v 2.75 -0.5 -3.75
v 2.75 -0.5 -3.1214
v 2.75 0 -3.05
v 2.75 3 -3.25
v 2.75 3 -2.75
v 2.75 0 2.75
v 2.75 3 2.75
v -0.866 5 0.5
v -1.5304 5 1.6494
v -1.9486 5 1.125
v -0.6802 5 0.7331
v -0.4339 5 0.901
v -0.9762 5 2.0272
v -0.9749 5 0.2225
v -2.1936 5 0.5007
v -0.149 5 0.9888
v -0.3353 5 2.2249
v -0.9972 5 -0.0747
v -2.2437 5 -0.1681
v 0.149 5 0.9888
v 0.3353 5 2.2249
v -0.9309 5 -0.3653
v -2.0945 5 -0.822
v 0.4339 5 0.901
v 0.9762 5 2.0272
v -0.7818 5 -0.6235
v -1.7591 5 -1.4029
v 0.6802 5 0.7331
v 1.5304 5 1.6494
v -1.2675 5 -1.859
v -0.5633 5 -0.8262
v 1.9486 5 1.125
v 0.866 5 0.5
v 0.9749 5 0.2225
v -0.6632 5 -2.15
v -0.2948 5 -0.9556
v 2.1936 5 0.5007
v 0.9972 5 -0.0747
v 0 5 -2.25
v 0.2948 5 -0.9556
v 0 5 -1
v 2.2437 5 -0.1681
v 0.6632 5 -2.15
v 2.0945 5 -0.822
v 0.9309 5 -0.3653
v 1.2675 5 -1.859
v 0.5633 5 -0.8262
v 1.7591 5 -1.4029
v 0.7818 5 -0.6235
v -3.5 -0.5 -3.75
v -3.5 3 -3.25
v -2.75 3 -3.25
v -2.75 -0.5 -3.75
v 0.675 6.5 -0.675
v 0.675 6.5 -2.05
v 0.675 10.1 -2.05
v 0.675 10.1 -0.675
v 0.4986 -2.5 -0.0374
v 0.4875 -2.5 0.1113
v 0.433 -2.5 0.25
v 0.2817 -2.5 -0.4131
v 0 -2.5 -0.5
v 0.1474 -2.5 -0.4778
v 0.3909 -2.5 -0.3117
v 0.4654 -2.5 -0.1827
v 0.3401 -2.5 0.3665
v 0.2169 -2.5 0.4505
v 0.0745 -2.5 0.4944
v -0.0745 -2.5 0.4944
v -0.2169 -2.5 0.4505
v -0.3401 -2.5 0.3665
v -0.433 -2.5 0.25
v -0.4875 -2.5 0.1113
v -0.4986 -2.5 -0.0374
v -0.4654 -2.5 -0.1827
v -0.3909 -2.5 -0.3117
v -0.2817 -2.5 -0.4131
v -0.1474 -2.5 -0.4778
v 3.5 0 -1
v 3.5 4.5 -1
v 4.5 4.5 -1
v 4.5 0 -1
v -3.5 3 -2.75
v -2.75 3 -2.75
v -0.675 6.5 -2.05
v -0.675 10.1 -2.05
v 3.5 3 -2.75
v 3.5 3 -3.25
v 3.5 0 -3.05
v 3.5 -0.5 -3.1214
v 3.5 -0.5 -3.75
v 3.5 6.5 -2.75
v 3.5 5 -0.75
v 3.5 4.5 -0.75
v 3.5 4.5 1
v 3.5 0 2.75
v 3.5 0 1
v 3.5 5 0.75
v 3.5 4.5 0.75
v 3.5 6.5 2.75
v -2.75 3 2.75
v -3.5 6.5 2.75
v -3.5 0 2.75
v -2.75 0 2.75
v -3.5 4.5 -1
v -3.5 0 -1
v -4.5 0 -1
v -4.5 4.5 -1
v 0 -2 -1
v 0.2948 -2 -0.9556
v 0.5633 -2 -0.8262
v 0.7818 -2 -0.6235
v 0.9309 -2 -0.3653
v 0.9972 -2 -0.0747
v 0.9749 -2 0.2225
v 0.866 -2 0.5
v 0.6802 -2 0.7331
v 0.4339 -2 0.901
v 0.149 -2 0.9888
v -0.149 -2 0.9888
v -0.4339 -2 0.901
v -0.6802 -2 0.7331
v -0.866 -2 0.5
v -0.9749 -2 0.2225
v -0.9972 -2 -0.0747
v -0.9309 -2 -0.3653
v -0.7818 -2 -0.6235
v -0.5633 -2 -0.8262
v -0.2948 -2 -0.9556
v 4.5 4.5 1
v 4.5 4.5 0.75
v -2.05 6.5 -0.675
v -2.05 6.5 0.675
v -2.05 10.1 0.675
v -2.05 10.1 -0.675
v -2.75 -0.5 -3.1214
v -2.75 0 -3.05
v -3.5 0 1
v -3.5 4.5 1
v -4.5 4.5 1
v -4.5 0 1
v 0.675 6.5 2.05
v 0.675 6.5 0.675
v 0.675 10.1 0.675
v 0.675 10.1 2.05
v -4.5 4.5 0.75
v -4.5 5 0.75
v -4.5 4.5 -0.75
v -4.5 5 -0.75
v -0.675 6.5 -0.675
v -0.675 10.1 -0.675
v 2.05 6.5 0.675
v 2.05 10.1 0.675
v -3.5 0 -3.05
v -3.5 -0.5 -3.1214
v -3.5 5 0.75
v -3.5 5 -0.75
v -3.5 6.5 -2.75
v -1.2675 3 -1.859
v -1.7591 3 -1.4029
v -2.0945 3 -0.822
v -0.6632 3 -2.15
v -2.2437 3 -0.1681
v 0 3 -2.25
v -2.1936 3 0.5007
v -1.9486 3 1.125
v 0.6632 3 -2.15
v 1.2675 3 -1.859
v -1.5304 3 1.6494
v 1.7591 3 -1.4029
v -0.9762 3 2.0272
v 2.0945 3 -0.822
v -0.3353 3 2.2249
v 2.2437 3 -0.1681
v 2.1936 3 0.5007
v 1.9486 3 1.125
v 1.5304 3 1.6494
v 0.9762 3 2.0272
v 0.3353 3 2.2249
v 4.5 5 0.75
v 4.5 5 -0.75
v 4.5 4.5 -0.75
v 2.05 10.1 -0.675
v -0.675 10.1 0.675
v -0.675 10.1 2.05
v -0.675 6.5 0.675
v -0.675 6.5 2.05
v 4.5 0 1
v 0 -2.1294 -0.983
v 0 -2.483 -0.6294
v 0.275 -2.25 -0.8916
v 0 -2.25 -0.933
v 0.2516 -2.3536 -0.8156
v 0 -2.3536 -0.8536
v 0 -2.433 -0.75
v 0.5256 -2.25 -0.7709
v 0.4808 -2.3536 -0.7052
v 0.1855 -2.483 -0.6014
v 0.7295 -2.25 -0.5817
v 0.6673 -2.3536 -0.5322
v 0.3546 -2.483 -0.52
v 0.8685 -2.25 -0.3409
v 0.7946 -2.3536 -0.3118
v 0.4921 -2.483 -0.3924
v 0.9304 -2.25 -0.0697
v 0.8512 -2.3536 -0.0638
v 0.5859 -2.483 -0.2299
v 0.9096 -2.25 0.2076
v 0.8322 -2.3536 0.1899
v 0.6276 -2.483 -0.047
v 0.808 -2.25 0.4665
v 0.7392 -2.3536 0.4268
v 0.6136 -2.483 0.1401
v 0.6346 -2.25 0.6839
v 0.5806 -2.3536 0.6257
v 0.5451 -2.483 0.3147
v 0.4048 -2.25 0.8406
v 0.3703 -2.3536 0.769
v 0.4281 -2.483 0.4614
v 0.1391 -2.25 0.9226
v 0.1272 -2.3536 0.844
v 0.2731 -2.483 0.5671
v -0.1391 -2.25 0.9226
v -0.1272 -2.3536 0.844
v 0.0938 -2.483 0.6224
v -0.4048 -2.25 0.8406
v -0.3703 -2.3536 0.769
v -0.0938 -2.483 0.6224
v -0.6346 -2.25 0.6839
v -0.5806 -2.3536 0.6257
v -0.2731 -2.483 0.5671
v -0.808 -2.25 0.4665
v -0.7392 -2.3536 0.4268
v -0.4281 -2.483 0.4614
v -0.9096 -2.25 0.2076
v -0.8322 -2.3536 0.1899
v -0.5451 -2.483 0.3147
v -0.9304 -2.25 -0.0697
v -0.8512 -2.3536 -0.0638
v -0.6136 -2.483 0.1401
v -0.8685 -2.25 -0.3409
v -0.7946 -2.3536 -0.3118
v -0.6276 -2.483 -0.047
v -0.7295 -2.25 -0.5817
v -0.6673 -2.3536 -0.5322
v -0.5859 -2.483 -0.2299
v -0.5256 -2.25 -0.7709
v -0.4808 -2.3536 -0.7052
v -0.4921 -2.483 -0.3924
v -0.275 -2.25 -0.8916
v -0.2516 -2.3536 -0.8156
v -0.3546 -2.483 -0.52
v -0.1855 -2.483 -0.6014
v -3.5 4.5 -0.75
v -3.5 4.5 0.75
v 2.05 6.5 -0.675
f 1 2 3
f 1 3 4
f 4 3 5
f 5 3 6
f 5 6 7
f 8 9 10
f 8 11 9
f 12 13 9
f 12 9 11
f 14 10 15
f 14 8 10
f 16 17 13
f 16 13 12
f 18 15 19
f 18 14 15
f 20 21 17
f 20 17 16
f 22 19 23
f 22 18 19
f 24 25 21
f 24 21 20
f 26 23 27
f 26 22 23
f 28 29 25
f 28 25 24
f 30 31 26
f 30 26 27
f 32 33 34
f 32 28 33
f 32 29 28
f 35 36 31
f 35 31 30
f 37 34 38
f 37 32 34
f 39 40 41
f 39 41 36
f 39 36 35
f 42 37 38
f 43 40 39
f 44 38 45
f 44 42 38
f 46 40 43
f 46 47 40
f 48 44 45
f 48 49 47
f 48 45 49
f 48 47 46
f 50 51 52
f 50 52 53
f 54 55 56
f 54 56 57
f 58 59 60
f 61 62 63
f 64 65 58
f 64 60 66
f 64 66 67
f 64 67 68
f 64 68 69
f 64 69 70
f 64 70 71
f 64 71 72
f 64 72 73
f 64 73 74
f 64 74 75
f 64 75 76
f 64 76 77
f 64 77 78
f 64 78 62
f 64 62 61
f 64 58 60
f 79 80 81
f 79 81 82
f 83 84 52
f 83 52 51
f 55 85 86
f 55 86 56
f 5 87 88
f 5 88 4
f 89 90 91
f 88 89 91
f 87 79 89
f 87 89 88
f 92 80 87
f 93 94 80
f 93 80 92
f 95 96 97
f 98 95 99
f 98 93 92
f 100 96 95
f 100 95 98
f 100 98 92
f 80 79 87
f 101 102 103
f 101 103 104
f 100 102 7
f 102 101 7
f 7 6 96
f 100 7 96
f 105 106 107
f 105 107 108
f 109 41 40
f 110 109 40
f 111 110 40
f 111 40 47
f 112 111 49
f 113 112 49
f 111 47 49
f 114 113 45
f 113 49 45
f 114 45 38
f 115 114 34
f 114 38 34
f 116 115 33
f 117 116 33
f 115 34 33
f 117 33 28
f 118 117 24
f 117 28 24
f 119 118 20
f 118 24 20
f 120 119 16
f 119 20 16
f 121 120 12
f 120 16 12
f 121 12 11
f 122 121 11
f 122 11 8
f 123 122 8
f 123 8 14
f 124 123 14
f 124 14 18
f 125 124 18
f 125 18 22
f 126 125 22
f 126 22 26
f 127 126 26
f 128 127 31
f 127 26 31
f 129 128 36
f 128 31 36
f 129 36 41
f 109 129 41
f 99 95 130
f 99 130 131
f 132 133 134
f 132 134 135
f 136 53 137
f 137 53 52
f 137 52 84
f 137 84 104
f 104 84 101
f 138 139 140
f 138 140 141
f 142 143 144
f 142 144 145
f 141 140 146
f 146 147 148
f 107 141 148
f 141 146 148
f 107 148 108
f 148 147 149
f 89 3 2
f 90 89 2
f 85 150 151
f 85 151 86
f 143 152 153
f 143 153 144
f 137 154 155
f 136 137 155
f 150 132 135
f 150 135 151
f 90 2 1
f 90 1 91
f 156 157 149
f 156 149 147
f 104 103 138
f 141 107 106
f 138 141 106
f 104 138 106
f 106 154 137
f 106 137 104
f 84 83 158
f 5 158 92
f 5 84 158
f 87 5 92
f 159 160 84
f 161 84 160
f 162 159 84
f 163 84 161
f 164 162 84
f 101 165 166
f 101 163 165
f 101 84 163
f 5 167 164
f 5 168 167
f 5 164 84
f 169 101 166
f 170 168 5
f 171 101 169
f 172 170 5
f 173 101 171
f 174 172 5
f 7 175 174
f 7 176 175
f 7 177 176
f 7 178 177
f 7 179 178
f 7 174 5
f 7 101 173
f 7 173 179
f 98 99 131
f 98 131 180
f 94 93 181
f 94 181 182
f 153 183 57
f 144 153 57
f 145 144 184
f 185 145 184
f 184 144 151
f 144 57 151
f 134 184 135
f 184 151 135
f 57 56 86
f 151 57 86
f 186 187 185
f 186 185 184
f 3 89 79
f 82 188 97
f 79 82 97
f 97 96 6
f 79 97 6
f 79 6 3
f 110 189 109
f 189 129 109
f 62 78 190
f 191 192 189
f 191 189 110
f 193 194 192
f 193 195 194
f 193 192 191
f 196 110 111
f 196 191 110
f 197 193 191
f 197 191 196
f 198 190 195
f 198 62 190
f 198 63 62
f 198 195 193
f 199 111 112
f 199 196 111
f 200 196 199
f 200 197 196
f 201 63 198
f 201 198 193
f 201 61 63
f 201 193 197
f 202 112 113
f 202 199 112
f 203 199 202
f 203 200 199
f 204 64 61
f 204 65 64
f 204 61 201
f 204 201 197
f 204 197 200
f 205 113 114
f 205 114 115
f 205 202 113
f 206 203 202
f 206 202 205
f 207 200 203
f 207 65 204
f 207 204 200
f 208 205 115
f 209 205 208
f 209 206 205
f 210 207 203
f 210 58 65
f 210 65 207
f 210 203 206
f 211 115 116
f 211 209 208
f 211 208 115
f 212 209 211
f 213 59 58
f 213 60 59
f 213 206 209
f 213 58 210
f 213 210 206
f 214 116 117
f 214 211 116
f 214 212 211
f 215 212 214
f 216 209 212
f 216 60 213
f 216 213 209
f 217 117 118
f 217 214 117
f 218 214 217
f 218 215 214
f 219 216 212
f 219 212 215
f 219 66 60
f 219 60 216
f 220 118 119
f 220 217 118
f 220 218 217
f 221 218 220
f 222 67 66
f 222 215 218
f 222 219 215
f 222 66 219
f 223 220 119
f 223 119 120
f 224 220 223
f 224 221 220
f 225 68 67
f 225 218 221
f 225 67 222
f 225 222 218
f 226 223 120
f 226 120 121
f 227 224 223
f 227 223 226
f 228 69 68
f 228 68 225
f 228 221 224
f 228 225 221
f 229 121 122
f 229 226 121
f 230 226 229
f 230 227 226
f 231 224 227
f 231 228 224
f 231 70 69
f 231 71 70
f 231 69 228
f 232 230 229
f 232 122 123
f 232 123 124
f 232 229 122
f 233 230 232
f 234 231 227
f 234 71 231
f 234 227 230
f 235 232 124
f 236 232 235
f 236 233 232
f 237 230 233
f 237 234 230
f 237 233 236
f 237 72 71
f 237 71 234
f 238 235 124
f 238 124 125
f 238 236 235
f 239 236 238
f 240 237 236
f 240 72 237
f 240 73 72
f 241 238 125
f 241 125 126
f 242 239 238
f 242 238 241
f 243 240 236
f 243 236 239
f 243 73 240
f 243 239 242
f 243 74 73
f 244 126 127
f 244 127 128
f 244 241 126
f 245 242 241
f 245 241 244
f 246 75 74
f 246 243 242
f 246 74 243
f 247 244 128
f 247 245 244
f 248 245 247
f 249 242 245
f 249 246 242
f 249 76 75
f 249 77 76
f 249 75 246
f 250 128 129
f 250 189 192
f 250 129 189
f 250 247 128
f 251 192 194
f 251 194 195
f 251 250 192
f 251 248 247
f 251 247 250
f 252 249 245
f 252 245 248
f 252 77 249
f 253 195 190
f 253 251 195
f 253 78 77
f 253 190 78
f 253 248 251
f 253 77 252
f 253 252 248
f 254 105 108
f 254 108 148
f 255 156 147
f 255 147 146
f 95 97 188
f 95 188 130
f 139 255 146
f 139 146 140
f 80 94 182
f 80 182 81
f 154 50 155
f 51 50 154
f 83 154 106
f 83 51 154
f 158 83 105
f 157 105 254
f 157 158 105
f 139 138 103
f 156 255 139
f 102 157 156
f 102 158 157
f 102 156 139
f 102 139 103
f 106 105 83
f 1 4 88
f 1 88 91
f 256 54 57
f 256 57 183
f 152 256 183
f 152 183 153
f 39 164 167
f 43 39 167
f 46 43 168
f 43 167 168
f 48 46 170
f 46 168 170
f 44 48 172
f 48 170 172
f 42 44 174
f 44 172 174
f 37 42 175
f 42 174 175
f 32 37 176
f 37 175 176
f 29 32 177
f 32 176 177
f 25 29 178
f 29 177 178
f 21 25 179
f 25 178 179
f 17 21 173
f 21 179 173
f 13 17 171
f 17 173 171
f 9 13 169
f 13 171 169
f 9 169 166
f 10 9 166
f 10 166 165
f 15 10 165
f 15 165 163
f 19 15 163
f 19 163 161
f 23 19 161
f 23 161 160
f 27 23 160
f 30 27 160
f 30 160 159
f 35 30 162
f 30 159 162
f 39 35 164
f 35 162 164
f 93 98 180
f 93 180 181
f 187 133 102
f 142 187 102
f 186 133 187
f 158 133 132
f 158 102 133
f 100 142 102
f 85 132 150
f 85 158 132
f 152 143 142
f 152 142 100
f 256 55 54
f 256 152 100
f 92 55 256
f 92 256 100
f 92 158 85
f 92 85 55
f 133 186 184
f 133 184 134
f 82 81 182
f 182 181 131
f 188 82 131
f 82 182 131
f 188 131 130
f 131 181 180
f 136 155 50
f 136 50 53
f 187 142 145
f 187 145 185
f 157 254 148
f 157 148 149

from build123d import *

# Parameters (mm, degrees)
SKETCH1_W               = 7
SKETCH1_H               = 5.5
BOSS_EXTRUDE1_DEPTH     = 6.5
SKETCH4_W               = 5.5
SKETCH4_H               = 3
CUT_EXTRUDE1_DEPTH      = 10.20597632
BOSS_EXTRUDE2_DEPTH     = 1
BOSS_EXTRUDE3_DEPTH     = 1
SKETCH8_R               = 2.25
CUT_EXTRUDE2_DEPTH      = 2
BOSS_EXTRUDE4_DEPTH     = 3.6
SKETCH11_R              = 1
BOSS_EXTRUDE5_DEPTH     = 7.5
FILLET1_R               = 0.5
SKETCH12_W              = 0.75
SKETCH12_H              = 3
BOSS_EXTRUDE6_DEPTH     = 1
SKETCH14_W              = 0.75
SKETCH14_H              = 1
BOSS_EXTRUDE7_DEPTH     = 0.5
CUT_EXTRUDE3_DEPTH      = 14.419109508
CUT_EXTRUDE3_DEPTH_BACK = 14.419109508


with BuildPart() as part:
    # Sketch1 → Boss-Extrude1 (new body)
    with BuildSketch(Plane(origin=(0, 0, 0), x_dir=(1, 0, 0), z_dir=(0, 1, 0))):
        Rectangle(SKETCH1_W, SKETCH1_H)
    extrude(amount=BOSS_EXTRUDE1_DEPTH)

    # Sketch4 → Cut-Extrude1 (cut, through all)
    with BuildSketch(Plane.XY.offset(2.75)):
        with Locations((0, 1.5)):
            Rectangle(SKETCH4_W, SKETCH4_H)
    extrude(amount=-CUT_EXTRUDE1_DEPTH, mode=Mode.SUBTRACT)

    # Sketch6 → Boss-Extrude2 (add)
    with BuildSketch(Plane.ZY.offset(3.5)):
        Polygon((-1, 4.5), (-0.75, 4.5), (-0.75, 5), (0.75, 5), (0.75, 4.5), (1, 4.5), (1, 0), (-1, 0), align=None)
    extrude(amount=BOSS_EXTRUDE2_DEPTH)

    # Sketch7 → Boss-Extrude3 (add)
    with BuildSketch(Plane(origin=(3.5, 0, 0), x_dir=(0, 0, -1), z_dir=(1, 0, 0))):
        Polygon((-1, 0), (-1, 4.5), (-0.75, 4.5), (-0.75, 5), (0.75, 5), (0.75, 4.5), (1, 4.5), (1, 0), align=None)
    extrude(amount=BOSS_EXTRUDE3_DEPTH)

    # Sketch8 → Cut-Extrude2 (cut)
    with BuildSketch(Plane.XZ.offset(-3)):
        with Locations(Location((0, 0, 0), (0, 0, 270))):
            Circle(SKETCH8_R)
    extrude(amount=-CUT_EXTRUDE2_DEPTH, mode=Mode.SUBTRACT)

    # Sketch10 → Boss-Extrude4 (add)
    with BuildSketch(Plane(origin=(0, 6.5, 0), x_dir=(1, 0, 0), z_dir=(0, 1, 0))):
        Polygon((-2.05, -0.675), (-2.05, 0.675), (-0.675, 0.675), (-0.675, 2.05), (0.675, 2.05), (0.675, 0.675), (2.05, 0.675), (2.05, -0.675), (0.675, -0.675), (0.675, -2.05), (-0.675, -2.05), (-0.675, -0.675), align=None)
    extrude(amount=BOSS_EXTRUDE4_DEPTH)

    # Sketch11 → Boss-Extrude5 (add)
    with BuildSketch(Plane.XZ.offset(-5)):
        with Locations(Location((0, 0, 0), (0, 0, 270))):
            Circle(SKETCH11_R)
    extrude(amount=BOSS_EXTRUDE5_DEPTH)

    # Fillet1
    fillet1_edges = [part.edges().sort_by_distance(p)[0] for p in [
        (0, -2.5, 1),
    ]]
    fillet(fillet1_edges, radius=FILLET1_R)

    # Sketch12 → Boss-Extrude6 (add)
    with BuildSketch(Plane(origin=(0, 0, -2.75), x_dir=(-1, 0, 0), z_dir=(0, 0, -1))):
        with Locations((-3.125, 1.5)):
            Rectangle(SKETCH12_W, SKETCH12_H)
        with Locations((3.125, 1.5)):
            Rectangle(SKETCH12_W, SKETCH12_H)
    extrude(amount=BOSS_EXTRUDE6_DEPTH)

    # Sketch14 → Boss-Extrude7 (add)
    with BuildSketch(Plane.XZ):
        with Locations((-3.125, -3.25)):
            Rectangle(SKETCH14_W, SKETCH14_H)
        with Locations((3.125, -3.25)):
            Rectangle(SKETCH14_W, SKETCH14_H)
    extrude(amount=BOSS_EXTRUDE7_DEPTH)

    # Sketch15 → Cut-Extrude3 (cut, two sides: drawn at the far end of the back side and taken through both)
    with BuildSketch(Plane(origin=(3.5, 0, 0), x_dir=(0, 0, -1), z_dir=(1, 0, 0)).offset(-CUT_EXTRUDE3_DEPTH_BACK)):
        Polygon((3.75, 3), (3.25, 3), (3.75, -0.5), align=None)
        Polygon((2.75, 0), (3.05, 0), (3.121428571, -0.5), (2.75, -0.5), align=None)
    extrude(amount=CUT_EXTRUDE3_DEPTH + CUT_EXTRUDE3_DEPTH_BACK, mode=Mode.SUBTRACT)


solid = part.part
